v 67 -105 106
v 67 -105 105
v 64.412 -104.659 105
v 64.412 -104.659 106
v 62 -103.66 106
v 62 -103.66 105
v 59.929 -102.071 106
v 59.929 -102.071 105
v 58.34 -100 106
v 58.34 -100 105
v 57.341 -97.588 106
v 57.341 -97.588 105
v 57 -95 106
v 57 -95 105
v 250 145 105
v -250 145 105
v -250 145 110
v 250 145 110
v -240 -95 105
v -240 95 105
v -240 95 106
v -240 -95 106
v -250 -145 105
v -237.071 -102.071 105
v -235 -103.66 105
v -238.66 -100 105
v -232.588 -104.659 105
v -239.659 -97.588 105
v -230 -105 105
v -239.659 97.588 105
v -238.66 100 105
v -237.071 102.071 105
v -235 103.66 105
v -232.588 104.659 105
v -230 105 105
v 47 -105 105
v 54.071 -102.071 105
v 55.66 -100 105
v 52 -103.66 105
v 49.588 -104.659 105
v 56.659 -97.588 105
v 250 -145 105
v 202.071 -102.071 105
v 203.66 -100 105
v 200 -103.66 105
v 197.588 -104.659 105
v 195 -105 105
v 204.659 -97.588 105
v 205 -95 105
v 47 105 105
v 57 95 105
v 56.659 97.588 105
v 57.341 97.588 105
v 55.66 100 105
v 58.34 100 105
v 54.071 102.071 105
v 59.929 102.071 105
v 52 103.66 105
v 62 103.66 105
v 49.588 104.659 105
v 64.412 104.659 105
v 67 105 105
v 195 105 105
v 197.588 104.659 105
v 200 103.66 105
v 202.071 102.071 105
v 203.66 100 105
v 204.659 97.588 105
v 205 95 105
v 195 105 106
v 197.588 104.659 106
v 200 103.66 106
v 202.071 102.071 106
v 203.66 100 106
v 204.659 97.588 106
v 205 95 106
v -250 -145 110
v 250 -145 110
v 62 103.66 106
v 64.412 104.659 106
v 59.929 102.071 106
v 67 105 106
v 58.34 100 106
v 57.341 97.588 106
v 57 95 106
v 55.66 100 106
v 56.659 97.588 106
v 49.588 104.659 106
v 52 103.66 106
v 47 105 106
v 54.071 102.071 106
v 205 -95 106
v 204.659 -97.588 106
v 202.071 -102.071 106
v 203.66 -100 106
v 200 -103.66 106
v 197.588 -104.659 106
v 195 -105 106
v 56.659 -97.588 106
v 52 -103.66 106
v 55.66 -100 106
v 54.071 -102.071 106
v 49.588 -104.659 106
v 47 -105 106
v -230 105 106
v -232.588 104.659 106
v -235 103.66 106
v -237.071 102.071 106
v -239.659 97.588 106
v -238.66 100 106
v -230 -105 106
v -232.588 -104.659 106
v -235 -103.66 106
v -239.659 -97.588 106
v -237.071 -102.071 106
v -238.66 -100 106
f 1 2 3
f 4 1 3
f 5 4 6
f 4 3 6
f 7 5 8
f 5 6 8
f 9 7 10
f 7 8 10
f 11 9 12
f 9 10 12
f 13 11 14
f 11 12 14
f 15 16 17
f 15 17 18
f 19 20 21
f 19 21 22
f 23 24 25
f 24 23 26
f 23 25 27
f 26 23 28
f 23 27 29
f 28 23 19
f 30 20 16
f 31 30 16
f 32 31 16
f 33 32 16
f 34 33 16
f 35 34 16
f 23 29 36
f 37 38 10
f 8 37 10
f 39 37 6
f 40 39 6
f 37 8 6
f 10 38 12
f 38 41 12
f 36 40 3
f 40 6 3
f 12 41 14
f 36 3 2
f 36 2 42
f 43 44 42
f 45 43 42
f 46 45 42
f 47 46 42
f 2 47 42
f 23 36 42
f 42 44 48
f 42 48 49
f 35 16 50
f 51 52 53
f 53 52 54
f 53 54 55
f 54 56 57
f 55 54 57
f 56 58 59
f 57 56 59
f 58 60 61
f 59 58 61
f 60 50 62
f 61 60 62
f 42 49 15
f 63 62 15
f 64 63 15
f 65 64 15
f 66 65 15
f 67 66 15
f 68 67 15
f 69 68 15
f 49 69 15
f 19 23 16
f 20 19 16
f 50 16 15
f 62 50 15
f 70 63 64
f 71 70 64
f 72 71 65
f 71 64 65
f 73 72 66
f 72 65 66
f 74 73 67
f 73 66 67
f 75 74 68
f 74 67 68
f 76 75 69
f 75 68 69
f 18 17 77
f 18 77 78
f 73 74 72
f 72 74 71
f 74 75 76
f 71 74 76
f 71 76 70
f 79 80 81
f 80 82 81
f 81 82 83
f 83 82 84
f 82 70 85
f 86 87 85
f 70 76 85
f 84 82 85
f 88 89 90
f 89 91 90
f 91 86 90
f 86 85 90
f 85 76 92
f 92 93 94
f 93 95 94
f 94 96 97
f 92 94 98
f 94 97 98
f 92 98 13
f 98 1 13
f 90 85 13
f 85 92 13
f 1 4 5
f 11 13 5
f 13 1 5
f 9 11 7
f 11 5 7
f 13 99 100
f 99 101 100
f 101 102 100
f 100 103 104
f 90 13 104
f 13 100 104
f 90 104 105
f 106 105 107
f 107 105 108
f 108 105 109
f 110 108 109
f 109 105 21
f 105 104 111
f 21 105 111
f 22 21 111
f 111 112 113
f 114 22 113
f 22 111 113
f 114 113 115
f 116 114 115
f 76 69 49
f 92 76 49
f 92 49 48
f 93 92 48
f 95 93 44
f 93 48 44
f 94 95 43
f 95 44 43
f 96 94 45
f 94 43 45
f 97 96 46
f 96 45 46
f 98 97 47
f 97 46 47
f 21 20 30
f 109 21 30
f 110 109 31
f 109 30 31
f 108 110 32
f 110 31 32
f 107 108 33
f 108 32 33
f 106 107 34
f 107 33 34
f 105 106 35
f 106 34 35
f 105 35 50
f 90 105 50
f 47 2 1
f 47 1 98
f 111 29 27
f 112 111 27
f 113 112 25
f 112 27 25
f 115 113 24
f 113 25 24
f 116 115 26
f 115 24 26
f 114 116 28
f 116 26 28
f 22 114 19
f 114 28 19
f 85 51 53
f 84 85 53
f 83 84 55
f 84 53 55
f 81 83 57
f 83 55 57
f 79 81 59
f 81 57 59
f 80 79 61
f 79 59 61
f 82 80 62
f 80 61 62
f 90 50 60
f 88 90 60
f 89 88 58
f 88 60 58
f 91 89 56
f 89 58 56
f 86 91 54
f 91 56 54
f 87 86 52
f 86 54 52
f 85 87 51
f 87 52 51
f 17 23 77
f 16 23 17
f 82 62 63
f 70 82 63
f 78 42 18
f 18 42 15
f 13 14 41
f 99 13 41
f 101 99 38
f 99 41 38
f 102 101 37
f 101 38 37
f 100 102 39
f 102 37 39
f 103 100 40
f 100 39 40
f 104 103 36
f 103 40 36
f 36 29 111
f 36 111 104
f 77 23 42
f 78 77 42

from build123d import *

# Parameters (mm, degrees)
SKETCH005_W     = 500
SKETCH005_H     = 290
PAD005_DEPTH    = 5
POCKET_DEPTH    = 1
POCKET001_DEPTH = 1


with BuildPart() as part:
    # Sketch005 → Pad005 (new body)
    with BuildSketch(Plane.XY):
        Rectangle(SKETCH005_W, SKETCH005_H)
    extrude(amount=PAD005_DEPTH)

    # Sketch006 (on Face5 of Pad005) → Pocket (cut)
    with BuildSketch(Plane(origin=(0, 0, 0), x_dir=(1, 0, 0), z_dir=(0, 0, -1))):
        with BuildLine():
            Line((-230, 105), (47, 105))
            ThreePointArc((57, 95), (54.071068, 102.071068), (47, 105))
            Line((57, -95), (57, 95))
            ThreePointArc((47, -105), (54.071068, -102.071068), (57, -95))
            Line((-230, -105), (47, -105))
            ThreePointArc((-240, -95), (-237.071068, -102.071068), (-230, -105))
            Line((-240, -95), (-240, 95))
            ThreePointArc((-230, 105), (-237.071068, 102.071068), (-240, 95))
        make_face()
    extrude(amount=-POCKET_DEPTH, mode=Mode.SUBTRACT)

    # Sketch007 (on Face4 of Pocket) → Pocket001 (cut)
    with BuildSketch(Plane(origin=(0, 0, 0), x_dir=(1, 0, 0), z_dir=(0, 0, -1))):
        with BuildLine():
            Line((67, 105), (195, 105))
            ThreePointArc((205, 95), (202.071068, 102.071068), (195, 105))
            Line((205, -95), (205, 95))
            ThreePointArc((195, -105), (202.071068, -102.071068), (205, -95))
            Line((67, -105), (195, -105))
            ThreePointArc((57, -95), (59.928932, -102.071068), (67, -105))
            Line((57, -95), (57, 95))
            ThreePointArc((67, 105), (59.928932, 102.071068), (57, 95))
        make_face()
    extrude(amount=-POCKET001_DEPTH, mode=Mode.SUBTRACT)


with BuildPart() as part_1:
    # Body005 placement: moved
    add(part.part.moved(Location((0, 0, 105))))


solid = part_1.part
